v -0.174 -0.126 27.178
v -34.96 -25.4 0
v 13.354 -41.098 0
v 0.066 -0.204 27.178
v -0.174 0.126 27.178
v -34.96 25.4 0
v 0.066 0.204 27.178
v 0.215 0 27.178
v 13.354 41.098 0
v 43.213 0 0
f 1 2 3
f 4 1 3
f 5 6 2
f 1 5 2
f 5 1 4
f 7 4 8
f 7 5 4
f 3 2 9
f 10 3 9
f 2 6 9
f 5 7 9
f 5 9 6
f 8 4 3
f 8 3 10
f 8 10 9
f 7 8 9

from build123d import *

# Parameters (mm, degrees)
F1_DEPTH = 27.178
F2_SIZE2 = 34.786244
F2_SIZE  = 27.17799


# Not quite as in the source:
# - a fillet or chamfer is up to 0.001 mm smaller than in the source, because OpenCascade refuses the exact size


with BuildPart() as f1:
    # F0 (on Top) → F1 (new body)
    with BuildSketch(Plane.XY):
        Polygon((-34.96010078, -25.4), (13.3535702478, -41.0980633142), (43.2130610643, 0), (13.3535702478, 41.0980633142), (-34.96010078, 25.4), align=None)
    extrude(amount=F1_DEPTH)

    # F2 (size 27.178 and 34.7862536797 in the source; OpenCascade refuses exactly that, so slightly less here)
    f2_edges = [f1.edges().sort_by_distance(p)[0] for p in [
        (28.283316, -20.549032, 27.178),
        (-10.803265, 33.249032, 27.178),
        (-34.960101, 0, 27.178),
        (-10.803265, -33.249032, 27.178),
        (28.283316, 20.549032, 27.178),
    ]]
    chamfer(f2_edges, length=F2_SIZE, length2=F2_SIZE2)


solid = f1.part
